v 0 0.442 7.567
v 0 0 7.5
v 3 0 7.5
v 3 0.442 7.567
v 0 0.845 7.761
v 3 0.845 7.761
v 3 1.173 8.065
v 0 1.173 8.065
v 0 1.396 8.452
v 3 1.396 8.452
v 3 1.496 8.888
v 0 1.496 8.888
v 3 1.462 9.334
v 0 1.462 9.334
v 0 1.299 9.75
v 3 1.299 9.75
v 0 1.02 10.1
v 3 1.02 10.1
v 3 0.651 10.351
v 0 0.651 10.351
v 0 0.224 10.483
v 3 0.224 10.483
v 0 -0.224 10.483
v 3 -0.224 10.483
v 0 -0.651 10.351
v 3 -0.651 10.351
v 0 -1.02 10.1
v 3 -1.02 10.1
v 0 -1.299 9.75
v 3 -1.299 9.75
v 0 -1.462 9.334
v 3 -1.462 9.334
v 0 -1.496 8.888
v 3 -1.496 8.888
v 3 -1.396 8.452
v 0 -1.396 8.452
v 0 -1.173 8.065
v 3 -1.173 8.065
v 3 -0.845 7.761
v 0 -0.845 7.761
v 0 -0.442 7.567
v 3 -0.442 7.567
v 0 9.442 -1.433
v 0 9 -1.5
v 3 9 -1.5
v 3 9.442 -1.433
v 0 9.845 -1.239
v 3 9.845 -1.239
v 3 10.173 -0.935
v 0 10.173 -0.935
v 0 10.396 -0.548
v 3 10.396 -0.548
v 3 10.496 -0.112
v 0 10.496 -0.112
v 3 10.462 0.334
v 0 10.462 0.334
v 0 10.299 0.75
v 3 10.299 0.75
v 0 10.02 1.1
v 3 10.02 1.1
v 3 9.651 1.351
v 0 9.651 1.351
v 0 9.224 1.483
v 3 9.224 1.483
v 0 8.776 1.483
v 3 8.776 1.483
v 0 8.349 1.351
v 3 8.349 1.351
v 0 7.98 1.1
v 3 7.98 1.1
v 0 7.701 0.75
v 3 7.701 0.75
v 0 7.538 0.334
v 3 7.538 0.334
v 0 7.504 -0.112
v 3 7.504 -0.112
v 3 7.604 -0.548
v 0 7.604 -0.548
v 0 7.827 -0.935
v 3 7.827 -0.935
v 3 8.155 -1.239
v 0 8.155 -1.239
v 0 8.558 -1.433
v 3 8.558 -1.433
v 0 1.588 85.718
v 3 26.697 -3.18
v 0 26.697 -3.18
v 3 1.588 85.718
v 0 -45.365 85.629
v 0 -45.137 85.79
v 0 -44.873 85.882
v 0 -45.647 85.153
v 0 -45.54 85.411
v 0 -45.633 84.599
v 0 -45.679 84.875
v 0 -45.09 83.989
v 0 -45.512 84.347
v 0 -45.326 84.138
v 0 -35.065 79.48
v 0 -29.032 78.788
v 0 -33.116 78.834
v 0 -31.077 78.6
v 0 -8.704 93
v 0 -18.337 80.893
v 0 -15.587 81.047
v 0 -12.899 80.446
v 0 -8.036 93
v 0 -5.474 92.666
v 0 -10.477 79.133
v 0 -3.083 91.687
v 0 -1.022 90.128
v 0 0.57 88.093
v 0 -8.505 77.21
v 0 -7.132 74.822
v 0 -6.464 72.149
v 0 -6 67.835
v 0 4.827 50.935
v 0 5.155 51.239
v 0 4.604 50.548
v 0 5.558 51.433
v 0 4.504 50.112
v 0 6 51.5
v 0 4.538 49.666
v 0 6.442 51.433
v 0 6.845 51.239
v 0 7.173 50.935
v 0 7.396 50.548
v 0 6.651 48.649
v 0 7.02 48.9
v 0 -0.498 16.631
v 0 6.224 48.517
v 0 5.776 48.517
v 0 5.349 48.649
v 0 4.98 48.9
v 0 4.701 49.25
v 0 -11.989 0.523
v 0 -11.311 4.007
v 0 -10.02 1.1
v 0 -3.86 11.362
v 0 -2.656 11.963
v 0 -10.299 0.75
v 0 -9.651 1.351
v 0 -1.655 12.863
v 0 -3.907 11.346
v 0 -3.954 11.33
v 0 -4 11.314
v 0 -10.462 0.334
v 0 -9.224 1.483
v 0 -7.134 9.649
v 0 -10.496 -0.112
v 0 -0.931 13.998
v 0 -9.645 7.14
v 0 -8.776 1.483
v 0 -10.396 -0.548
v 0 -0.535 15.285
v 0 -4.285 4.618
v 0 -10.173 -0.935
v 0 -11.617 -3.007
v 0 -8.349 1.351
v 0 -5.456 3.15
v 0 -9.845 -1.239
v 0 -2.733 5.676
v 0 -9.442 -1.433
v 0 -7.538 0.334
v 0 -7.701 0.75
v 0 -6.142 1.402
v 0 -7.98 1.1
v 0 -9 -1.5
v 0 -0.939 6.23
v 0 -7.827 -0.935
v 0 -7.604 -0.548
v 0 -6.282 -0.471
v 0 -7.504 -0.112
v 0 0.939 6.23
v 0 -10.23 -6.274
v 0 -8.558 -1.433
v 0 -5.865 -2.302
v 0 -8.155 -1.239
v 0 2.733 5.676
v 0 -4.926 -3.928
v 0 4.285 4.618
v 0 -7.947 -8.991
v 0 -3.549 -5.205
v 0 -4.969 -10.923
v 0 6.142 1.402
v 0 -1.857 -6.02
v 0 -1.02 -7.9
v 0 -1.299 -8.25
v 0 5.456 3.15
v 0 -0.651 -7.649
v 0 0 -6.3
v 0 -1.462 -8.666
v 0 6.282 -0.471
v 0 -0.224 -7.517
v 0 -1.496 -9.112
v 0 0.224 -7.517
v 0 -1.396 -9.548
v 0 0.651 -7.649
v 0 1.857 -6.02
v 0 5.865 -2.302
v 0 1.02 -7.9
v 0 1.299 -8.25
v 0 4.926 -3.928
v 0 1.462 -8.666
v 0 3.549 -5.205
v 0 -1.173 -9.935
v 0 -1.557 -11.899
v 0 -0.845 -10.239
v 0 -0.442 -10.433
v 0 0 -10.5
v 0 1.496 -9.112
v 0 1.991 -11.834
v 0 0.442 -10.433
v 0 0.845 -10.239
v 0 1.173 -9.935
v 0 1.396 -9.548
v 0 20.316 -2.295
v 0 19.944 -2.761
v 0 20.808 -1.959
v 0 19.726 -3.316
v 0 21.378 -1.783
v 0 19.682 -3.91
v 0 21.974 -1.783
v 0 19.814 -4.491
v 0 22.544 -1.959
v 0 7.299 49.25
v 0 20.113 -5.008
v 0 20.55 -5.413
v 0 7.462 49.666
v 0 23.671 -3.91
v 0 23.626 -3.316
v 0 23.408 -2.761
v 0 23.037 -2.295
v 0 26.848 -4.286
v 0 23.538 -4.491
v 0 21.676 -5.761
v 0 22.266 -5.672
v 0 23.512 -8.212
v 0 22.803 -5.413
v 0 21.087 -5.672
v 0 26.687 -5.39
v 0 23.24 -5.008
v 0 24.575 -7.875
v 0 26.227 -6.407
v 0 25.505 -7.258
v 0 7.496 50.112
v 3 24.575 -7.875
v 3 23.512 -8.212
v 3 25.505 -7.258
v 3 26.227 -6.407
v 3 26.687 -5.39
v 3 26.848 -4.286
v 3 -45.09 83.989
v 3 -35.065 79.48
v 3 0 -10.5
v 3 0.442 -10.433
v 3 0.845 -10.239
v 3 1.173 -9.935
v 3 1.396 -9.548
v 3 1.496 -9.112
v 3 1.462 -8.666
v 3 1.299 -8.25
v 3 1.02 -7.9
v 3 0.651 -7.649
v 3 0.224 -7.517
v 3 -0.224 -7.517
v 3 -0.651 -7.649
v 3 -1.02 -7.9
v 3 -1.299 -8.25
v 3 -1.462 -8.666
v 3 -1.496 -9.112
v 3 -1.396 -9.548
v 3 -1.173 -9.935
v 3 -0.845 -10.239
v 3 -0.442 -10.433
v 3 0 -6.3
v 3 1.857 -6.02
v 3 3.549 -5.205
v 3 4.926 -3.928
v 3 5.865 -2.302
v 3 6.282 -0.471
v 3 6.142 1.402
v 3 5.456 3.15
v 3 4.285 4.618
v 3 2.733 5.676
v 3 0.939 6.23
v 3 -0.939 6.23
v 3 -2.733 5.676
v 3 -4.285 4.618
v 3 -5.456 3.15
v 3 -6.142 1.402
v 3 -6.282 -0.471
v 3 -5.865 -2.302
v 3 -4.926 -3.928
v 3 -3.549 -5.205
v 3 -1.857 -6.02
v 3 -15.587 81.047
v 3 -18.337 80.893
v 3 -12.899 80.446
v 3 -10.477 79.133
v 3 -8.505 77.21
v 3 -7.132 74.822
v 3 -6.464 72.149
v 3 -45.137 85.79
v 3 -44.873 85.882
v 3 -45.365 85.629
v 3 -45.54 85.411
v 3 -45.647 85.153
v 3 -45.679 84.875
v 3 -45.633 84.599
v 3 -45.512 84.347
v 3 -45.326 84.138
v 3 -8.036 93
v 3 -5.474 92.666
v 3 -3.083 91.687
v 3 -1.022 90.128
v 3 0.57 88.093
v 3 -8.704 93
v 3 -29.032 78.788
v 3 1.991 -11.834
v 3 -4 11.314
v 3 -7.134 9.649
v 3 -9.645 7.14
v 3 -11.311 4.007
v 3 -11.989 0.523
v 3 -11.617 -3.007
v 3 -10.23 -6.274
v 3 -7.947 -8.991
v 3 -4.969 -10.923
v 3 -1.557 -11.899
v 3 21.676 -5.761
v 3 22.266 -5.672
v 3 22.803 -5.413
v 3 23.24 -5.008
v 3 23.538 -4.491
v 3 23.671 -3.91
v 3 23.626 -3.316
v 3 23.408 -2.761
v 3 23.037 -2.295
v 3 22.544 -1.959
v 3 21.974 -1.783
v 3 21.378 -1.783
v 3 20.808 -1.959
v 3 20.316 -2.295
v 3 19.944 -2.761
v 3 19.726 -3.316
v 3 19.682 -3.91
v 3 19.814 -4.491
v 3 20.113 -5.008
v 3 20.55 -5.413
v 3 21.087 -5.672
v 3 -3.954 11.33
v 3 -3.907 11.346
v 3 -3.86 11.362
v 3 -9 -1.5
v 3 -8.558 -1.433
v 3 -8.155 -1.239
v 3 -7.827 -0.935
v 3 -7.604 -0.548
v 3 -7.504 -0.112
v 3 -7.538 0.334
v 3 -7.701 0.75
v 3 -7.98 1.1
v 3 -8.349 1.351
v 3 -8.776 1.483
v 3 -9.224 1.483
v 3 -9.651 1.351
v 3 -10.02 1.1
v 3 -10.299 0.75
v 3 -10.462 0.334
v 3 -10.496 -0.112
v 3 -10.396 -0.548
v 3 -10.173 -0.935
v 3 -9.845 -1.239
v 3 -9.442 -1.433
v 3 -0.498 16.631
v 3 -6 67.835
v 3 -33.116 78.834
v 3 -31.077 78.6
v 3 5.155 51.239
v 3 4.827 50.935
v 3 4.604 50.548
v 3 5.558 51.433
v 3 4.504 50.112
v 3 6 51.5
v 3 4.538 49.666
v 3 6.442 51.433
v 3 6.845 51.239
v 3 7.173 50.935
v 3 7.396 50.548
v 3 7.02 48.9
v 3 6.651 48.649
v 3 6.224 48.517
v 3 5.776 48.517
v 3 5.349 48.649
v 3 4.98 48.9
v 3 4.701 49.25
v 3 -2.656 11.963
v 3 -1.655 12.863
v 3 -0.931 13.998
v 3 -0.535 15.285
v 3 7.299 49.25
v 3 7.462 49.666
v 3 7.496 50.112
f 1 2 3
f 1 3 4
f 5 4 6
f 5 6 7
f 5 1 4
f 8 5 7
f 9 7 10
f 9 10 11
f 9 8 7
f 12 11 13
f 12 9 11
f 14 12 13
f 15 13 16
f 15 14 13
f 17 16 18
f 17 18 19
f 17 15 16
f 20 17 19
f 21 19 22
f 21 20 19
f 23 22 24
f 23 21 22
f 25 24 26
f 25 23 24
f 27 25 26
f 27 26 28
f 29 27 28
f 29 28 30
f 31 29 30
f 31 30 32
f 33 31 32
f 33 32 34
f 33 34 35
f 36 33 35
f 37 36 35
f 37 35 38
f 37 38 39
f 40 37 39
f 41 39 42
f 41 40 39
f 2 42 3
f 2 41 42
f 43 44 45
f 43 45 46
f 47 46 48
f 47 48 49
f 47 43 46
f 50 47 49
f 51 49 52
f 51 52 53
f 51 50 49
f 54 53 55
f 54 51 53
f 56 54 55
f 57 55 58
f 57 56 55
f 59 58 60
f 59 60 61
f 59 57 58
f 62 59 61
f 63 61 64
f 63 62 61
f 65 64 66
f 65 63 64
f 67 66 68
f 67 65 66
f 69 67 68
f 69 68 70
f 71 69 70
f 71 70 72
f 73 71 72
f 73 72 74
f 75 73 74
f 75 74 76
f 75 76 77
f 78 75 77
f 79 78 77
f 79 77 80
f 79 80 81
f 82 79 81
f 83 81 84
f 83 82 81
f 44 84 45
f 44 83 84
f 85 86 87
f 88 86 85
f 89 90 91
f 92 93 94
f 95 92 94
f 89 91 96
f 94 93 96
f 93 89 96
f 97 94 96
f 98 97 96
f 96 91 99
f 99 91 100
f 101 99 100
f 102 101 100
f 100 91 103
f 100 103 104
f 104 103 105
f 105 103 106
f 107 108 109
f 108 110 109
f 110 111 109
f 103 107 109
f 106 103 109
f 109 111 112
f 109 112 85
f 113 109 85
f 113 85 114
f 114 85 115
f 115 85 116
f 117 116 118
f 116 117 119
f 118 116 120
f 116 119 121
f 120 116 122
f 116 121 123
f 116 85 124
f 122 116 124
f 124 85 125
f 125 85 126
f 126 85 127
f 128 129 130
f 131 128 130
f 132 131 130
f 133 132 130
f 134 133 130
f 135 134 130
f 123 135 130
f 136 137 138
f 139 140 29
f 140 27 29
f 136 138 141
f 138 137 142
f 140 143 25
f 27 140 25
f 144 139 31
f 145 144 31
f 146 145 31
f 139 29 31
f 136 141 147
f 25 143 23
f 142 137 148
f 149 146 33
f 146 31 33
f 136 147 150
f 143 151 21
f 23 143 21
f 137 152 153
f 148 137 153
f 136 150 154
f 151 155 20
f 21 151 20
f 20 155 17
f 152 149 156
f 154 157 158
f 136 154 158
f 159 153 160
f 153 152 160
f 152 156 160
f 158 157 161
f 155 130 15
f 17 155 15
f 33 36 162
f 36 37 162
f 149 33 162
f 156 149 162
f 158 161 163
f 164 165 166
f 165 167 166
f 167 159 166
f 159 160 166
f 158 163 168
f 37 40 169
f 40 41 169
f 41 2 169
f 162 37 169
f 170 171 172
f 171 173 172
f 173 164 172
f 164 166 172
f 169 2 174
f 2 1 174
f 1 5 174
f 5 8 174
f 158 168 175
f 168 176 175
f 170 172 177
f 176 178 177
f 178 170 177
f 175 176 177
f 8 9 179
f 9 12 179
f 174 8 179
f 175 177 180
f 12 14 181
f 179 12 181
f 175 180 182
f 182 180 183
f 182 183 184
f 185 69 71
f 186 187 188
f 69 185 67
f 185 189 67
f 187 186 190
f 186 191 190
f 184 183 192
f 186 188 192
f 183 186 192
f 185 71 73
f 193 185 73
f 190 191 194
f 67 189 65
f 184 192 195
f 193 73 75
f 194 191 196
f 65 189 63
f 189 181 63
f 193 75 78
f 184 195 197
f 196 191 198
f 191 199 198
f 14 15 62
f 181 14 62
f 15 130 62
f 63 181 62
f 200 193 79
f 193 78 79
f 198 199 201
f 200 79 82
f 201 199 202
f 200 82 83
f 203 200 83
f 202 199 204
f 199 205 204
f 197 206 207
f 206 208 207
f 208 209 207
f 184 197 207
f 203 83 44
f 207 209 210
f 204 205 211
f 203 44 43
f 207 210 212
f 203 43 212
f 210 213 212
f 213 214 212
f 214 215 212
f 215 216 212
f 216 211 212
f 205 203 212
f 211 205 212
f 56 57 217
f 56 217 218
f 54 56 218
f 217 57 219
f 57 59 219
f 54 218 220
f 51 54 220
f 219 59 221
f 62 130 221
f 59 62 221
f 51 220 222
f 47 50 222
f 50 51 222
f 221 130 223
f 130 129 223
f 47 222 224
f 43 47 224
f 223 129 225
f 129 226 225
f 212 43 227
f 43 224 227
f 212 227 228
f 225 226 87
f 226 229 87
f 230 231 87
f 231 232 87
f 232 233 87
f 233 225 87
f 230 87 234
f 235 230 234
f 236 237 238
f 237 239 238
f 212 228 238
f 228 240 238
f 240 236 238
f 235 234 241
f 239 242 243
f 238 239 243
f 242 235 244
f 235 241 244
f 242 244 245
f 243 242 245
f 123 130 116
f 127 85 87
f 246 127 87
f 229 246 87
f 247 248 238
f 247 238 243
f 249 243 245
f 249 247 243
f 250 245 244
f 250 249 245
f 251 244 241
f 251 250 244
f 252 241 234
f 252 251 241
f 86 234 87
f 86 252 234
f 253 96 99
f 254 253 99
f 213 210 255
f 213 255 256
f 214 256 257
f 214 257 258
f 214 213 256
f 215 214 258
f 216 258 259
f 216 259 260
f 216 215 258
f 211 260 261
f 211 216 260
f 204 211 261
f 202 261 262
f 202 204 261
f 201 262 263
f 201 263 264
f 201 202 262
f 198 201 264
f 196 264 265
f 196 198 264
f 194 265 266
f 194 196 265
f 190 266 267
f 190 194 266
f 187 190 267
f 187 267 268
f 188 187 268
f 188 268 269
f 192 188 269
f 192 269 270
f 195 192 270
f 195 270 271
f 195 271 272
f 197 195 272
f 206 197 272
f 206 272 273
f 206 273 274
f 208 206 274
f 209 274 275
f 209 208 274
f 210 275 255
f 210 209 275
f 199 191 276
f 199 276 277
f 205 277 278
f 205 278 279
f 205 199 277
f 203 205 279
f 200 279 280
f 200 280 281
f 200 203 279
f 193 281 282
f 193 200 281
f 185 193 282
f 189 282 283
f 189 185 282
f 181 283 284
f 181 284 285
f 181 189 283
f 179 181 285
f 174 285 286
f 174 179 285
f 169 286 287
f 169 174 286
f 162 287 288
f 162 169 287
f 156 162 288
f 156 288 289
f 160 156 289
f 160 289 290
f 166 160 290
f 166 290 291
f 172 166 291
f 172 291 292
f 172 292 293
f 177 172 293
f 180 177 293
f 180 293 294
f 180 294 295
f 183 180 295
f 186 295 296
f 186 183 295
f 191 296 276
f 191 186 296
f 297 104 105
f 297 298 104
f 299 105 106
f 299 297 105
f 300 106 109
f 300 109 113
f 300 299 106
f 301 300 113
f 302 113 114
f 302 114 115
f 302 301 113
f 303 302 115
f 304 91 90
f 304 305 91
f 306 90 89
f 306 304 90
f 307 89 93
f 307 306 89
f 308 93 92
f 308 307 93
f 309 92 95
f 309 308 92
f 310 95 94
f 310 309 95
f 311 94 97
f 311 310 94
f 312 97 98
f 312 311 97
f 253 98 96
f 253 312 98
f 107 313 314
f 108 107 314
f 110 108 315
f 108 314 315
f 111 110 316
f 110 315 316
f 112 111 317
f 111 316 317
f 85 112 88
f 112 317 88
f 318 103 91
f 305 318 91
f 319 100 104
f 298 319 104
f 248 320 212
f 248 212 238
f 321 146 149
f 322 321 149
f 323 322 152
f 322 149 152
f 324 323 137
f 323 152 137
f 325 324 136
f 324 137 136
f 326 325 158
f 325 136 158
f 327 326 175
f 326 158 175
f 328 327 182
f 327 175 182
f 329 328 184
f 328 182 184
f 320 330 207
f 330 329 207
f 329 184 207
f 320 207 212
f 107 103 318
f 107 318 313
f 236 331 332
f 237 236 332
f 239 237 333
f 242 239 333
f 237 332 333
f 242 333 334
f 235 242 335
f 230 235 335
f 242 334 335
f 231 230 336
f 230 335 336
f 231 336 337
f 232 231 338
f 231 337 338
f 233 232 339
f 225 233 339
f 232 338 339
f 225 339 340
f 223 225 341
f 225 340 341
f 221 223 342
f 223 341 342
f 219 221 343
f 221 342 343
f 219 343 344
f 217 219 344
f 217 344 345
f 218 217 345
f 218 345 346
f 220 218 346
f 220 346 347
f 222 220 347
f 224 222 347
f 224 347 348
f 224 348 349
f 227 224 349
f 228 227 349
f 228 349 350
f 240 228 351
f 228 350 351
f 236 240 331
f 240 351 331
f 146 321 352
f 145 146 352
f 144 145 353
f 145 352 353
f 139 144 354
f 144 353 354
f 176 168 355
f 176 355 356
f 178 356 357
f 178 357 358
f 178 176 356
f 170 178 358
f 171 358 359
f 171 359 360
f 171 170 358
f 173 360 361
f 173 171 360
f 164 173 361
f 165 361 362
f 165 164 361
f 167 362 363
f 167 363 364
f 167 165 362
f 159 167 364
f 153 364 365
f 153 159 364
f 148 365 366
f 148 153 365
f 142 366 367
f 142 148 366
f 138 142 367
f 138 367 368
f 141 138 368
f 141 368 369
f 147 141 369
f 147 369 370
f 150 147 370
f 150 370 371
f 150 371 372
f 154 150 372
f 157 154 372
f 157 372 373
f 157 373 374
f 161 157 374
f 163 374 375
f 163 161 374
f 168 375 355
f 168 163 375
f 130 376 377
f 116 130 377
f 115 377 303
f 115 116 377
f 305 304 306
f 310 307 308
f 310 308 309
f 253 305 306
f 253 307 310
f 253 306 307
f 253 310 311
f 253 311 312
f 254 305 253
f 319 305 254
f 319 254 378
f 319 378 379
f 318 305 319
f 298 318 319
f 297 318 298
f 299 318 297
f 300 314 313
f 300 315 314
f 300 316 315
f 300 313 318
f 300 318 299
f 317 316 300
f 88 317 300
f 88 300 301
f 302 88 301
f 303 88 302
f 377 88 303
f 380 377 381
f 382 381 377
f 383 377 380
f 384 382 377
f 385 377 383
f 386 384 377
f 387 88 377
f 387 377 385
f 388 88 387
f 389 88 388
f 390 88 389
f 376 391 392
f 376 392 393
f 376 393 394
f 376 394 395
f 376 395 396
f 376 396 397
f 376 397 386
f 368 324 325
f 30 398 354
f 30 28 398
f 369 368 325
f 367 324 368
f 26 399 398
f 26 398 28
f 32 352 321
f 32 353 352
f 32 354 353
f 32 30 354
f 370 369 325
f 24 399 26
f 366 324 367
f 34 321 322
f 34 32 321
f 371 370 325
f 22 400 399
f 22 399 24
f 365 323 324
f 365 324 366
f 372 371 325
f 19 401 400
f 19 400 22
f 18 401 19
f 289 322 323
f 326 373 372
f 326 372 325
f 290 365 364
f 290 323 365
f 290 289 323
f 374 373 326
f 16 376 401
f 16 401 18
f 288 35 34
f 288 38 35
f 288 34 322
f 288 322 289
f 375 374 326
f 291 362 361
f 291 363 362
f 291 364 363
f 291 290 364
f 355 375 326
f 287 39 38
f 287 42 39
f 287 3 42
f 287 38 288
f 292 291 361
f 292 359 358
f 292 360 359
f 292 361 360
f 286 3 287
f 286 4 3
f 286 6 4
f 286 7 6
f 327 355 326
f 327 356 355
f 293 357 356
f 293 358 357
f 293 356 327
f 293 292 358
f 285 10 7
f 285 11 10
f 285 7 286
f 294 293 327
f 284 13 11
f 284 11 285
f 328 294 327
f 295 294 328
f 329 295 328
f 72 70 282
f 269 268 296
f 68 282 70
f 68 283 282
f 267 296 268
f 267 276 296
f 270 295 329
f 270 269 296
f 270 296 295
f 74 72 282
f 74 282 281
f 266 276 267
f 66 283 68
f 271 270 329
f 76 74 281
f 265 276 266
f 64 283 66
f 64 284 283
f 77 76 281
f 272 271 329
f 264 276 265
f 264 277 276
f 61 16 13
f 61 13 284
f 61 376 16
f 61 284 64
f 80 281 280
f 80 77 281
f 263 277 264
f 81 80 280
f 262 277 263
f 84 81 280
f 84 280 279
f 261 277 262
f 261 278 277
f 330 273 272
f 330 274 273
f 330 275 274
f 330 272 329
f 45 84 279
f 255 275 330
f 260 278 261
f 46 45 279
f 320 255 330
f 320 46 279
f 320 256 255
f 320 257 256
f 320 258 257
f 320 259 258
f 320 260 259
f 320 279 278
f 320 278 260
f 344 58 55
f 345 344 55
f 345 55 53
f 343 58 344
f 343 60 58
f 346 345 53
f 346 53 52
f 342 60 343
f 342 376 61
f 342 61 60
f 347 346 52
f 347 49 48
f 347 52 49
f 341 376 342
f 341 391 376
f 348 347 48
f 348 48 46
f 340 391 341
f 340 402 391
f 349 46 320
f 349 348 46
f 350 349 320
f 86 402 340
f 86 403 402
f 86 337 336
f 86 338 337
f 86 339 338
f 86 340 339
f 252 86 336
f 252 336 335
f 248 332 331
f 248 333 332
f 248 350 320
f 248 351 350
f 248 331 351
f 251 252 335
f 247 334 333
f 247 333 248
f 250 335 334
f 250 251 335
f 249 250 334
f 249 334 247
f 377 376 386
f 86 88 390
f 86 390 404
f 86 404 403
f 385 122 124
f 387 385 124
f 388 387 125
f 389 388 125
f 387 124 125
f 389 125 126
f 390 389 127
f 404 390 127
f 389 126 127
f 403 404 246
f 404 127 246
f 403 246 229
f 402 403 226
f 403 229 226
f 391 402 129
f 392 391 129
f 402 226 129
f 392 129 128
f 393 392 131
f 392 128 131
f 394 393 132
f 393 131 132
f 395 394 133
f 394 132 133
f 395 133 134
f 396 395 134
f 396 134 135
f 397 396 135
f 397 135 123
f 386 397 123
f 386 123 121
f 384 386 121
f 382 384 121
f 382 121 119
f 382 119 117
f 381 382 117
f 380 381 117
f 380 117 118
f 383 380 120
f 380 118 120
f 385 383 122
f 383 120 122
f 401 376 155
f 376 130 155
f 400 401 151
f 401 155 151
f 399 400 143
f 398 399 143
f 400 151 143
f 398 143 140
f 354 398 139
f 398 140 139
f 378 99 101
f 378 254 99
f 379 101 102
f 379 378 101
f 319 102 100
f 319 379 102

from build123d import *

# Parameters (mm, degrees)
SKETCH_1_R          = 12
SKETCH_1_R_2        = 1.5
SKETCH_1_R_3        = 6.3
EXTRUDE_1_DEPTH     = 3
EXTRUDE_2_DEPTH     = 3
FILLET_2_R          = 30
FILLET_4_R          = 1
SKETCH_3_R          = 1.5
CUT_EXTRUDE_1_DEPTH = 3
FILLET_6_R          = 3
SKETCH_5_R          = 2
EXTRUDE_3_DEPTH     = 3
FILLET_8_R          = 3
CUT_EXTRUDE_2_DEPTH = 10
EXTRUDE_4_DEPTH     = 3
CUT_EXTRUDE_4_DEPTH = 88.351282371
EXTRUDE_5_DEPTH     = 3
EXTRUDE_6_DEPTH     = 3
FILLET_9_R          = 10
FILLET_10_R         = 1
EXTRUDE_8_DEPTH     = 3
FILLET_11_R         = 5


with BuildPart() as part:
    # 草图1 → 凸台-拉伸1 (new body)
    with BuildSketch(Plane(origin=(0, 0, 0), x_dir=(0, 0, -1), z_dir=(1, 0, 0))):
        Circle(SKETCH_1_R)
        with Locations((0, 9)):
            Circle(SKETCH_1_R_2, mode=Mode.SUBTRACT)
        Circle(SKETCH_1_R_3, mode=Mode.SUBTRACT)
        with Locations((9, 0)):
            Circle(SKETCH_1_R_2, mode=Mode.SUBTRACT)
        with Locations((0, -9)):
            Circle(SKETCH_1_R_2, mode=Mode.SUBTRACT)
        with Locations((-9, 0)):
            Circle(SKETCH_1_R_2, mode=Mode.SUBTRACT)
    extrude(amount=EXTRUDE_1_DEPTH)

    # 草图4 → 凸台-拉伸2 (add)
    with BuildSketch(Plane.ZY):
        with BuildLine():
            Line((68.504845759, -22.032619578), (78, -30))
            Line((78, -30), (78, 3))
            Line((78, 3), (18.911534819, 13.41889066))
            Line((18.911534819, 13.41889066), (-0.877535827, 11.967870774))
            ThreePointArc((-0.877535827, 11.967870774), (8.169136125, 8.790063422), (12, 0))
            ThreePointArc((12, 0), (11.827182716, -2.029223745), (11.313708499, -4))
            Line((11.313708499, -4), (32.009040998, -6.929191455))
            Line((32.009040998, -6.929191455), (67.339599923, -4.571456898))
            Line((67.339599923, -4.571456898), (67.835333173, -12))
            Line((67.835333173, -12), (68.504845759, -22.032619578))
        make_face()
        Polygon((32.009040998, -6.929191455), (67.835333173, -12), (67.339599923, -4.571456898), align=None)
    extrude(amount=-EXTRUDE_2_DEPTH)

    # 圆角2
    fillet_2_edges = [part.edges().sort_by_distance(p)[0] for p in [
        (1.5, 13.41889066, 18.911534819),
    ]]
    fillet(fillet_2_edges, radius=FILLET_2_R)

    # 圆角4
    fillet_4_edges = [part.edges().sort_by_distance(p)[0] for p in [
        (1.5, -30, 78),
    ]]
    fillet(fillet_4_edges, radius=FILLET_4_R)

    # 草图3 → 切除-拉伸1 (cut)
    with BuildSketch(Plane.ZY):
        with Locations((50, 6)):
            Circle(SKETCH_3_R)
    extrude(amount=-CUT_EXTRUDE_1_DEPTH, mode=Mode.SUBTRACT)

    # 圆角6
    fillet_6_edges = [part.edges().sort_by_distance(p)[0] for p in [
        (1.5, -22.032619578, 68.504845759),
    ]]
    fillet(fillet_6_edges, radius=FILLET_6_R)

    # 草图5 → 凸台-拉伸3 (add)
    with BuildSketch(Plane(origin=(3, 0, 0), x_dir=(0, 0, -1), z_dir=(1, 0, 0))):
        with BuildLine():
            Line((11.833611983, 1.991388321), (8.212146403, 23.511559971))
            ThreePointArc((8.212146403, 23.511559971), (6.010394905, 26.448138505), (2.341304536, 26.353380903))
            Line((2.341304536, 26.353380903), (-22.28242614, 12.822865834))
            Line((-22.28242614, 12.822865834), (0.877535827, 11.967870774))
            Line((0.877535827, 11.967870774), (11.833611983, 1.991388321))
        make_face()
        with Locations((3.76079209, 21.676172237)):
            Circle(SKETCH_5_R, mode=Mode.SUBTRACT)
    extrude(amount=-EXTRUDE_3_DEPTH)

    # 圆角8
    fillet_8_edges = [part.edges().sort_by_distance(p)[0] for p in [
        (1.5, 12.822865834, 22.28242614),
    ]]
    fillet(fillet_8_edges, radius=FILLET_8_R)

    # 草图6 → 切除-拉伸2 (cut)
    with BuildSketch(Plane(origin=(3, 0, 0), x_dir=(0, 0, -1), z_dir=(1, 0, 0))):
        with BuildLine():
            ThreePointArc((-11.313708499, -4), (-11.827182716, -2.029223745), (-12, 0))
            Line((-12, 0), (-67.835333173, -6))
            Line((-67.835333173, -6), (-67.835333173, -12))
            Line((-67.835333173, -12), (-11.313708499, -4))
        make_face()
    extrude(amount=-CUT_EXTRUDE_2_DEPTH, mode=Mode.SUBTRACT)

    # 草图7 → 凸台-拉伸4 (add)
    with BuildSketch(Plane(origin=(3, 0, 0), x_dir=(0, 0, -1), z_dir=(1, 0, 0))):
        with BuildLine():
            ThreePointArc((-76.35721239, -28.621537523), (-77.422618262, -28.761800867), (-78, -27.855493079))
            Line((-78, -27.855493079), (-78, -39.207735307))
            Line((-78, -39.207735307), (-65.698458682, -28.885516524))
            Line((-65.698458682, -28.885516524), (-67.835333173, -9))
            Line((-67.835333173, -9), (-67.835333173, -12))
            Line((-67.835333173, -12), (-68.419679282, -20.756403294))
            ThreePointArc((-68.419679282, -20.756403294), (-68.737840819, -21.914368693), (-69.484658626, -22.854780194))
            Line((-69.484658626, -22.854780194), (-76.35721239, -28.621537523))
        make_face()
    extrude(amount=-EXTRUDE_4_DEPTH)

    # 草图9 → 切除-拉伸4 (cut, through all)
    with BuildSketch(Plane(origin=(3, 0, 0), x_dir=(0, 0, -1), z_dir=(1, 0, 0))):
        Polygon((-51.477915802, -4.242250943), (-102.730700366, -9.749815596), (-98.933525576, -45.085902185), (-47.680741012, -39.578337532), align=None)
    extrude(amount=-CUT_EXTRUDE_4_DEPTH, mode=Mode.SUBTRACT)

    # 草图10 → 凸台-拉伸5 (add)
    with BuildSketch(Plane.ZY):
        Polygon((78, -7.092283282), (93, -8.704165846), (93, 0.355095289), (78, 3), align=None)
    extrude(amount=-EXTRUDE_5_DEPTH)

    # 草图11 → 凸台-拉伸6 (add)
    with BuildSketch(Plane.ZY):
        Polygon((93, -8.704165846), (85.276239998, -47.951376338), (78.172649999, -32.159084028), (83, -7.62957747), align=None)
    extrude(amount=-EXTRUDE_6_DEPTH)

    # 圆角9
    fillet_9_edges = [part.edges().sort_by_distance(p)[0] for p in [
        (1.5, 0.355095289, 93),
        (1.5, -32.159084028, 78.172649999),
        (1.5, -7.62957747, 83),
    ]]
    fillet(fillet_9_edges, radius=FILLET_9_R)

    # 圆角10
    fillet_10_edges = [part.edges().sort_by_distance(p)[0] for p in [
        (1.5, -47.951376338, 85.276239998),
    ]]
    fillet(fillet_10_edges, radius=FILLET_10_R)

    # 草图12 → 凸台-拉伸8 (add)
    with BuildSketch(Plane(origin=(3, 0, 0), x_dir=(0, 0, -1), z_dir=(1, 0, 0))):
        with BuildLine():
            Line((3.180339281, 26.697159193), (-85.718174485, 1.587587299))
            ThreePointArc((-85.718174485, 1.587587299), (-85.230157098, 1.712247485), (-84.736481777, 1.812176508))
            Line((-84.736481777, 1.812176508), (-22.766810048, 12.739101619))
            ThreePointArc((-22.766810048, 12.739101619), (-22.291557819, 12.863755981), (-21.843026177, 13.064312099))
            Line((-21.843026177, 13.064312099), (2.341304536, 26.353380903))
            ThreePointArc((2.341304536, 26.353380903), (2.751049335, 26.549121258), (3.180339281, 26.697159193))
        make_face()
    extrude(amount=-EXTRUDE_8_DEPTH)

    # 圆角11
    fillet_11_edges = [part.edges().sort_by_distance(p)[0] for p in [
        (1.5, 0, 12),
    ]]
    fillet(fillet_11_edges, radius=FILLET_11_R)


solid = part.part
